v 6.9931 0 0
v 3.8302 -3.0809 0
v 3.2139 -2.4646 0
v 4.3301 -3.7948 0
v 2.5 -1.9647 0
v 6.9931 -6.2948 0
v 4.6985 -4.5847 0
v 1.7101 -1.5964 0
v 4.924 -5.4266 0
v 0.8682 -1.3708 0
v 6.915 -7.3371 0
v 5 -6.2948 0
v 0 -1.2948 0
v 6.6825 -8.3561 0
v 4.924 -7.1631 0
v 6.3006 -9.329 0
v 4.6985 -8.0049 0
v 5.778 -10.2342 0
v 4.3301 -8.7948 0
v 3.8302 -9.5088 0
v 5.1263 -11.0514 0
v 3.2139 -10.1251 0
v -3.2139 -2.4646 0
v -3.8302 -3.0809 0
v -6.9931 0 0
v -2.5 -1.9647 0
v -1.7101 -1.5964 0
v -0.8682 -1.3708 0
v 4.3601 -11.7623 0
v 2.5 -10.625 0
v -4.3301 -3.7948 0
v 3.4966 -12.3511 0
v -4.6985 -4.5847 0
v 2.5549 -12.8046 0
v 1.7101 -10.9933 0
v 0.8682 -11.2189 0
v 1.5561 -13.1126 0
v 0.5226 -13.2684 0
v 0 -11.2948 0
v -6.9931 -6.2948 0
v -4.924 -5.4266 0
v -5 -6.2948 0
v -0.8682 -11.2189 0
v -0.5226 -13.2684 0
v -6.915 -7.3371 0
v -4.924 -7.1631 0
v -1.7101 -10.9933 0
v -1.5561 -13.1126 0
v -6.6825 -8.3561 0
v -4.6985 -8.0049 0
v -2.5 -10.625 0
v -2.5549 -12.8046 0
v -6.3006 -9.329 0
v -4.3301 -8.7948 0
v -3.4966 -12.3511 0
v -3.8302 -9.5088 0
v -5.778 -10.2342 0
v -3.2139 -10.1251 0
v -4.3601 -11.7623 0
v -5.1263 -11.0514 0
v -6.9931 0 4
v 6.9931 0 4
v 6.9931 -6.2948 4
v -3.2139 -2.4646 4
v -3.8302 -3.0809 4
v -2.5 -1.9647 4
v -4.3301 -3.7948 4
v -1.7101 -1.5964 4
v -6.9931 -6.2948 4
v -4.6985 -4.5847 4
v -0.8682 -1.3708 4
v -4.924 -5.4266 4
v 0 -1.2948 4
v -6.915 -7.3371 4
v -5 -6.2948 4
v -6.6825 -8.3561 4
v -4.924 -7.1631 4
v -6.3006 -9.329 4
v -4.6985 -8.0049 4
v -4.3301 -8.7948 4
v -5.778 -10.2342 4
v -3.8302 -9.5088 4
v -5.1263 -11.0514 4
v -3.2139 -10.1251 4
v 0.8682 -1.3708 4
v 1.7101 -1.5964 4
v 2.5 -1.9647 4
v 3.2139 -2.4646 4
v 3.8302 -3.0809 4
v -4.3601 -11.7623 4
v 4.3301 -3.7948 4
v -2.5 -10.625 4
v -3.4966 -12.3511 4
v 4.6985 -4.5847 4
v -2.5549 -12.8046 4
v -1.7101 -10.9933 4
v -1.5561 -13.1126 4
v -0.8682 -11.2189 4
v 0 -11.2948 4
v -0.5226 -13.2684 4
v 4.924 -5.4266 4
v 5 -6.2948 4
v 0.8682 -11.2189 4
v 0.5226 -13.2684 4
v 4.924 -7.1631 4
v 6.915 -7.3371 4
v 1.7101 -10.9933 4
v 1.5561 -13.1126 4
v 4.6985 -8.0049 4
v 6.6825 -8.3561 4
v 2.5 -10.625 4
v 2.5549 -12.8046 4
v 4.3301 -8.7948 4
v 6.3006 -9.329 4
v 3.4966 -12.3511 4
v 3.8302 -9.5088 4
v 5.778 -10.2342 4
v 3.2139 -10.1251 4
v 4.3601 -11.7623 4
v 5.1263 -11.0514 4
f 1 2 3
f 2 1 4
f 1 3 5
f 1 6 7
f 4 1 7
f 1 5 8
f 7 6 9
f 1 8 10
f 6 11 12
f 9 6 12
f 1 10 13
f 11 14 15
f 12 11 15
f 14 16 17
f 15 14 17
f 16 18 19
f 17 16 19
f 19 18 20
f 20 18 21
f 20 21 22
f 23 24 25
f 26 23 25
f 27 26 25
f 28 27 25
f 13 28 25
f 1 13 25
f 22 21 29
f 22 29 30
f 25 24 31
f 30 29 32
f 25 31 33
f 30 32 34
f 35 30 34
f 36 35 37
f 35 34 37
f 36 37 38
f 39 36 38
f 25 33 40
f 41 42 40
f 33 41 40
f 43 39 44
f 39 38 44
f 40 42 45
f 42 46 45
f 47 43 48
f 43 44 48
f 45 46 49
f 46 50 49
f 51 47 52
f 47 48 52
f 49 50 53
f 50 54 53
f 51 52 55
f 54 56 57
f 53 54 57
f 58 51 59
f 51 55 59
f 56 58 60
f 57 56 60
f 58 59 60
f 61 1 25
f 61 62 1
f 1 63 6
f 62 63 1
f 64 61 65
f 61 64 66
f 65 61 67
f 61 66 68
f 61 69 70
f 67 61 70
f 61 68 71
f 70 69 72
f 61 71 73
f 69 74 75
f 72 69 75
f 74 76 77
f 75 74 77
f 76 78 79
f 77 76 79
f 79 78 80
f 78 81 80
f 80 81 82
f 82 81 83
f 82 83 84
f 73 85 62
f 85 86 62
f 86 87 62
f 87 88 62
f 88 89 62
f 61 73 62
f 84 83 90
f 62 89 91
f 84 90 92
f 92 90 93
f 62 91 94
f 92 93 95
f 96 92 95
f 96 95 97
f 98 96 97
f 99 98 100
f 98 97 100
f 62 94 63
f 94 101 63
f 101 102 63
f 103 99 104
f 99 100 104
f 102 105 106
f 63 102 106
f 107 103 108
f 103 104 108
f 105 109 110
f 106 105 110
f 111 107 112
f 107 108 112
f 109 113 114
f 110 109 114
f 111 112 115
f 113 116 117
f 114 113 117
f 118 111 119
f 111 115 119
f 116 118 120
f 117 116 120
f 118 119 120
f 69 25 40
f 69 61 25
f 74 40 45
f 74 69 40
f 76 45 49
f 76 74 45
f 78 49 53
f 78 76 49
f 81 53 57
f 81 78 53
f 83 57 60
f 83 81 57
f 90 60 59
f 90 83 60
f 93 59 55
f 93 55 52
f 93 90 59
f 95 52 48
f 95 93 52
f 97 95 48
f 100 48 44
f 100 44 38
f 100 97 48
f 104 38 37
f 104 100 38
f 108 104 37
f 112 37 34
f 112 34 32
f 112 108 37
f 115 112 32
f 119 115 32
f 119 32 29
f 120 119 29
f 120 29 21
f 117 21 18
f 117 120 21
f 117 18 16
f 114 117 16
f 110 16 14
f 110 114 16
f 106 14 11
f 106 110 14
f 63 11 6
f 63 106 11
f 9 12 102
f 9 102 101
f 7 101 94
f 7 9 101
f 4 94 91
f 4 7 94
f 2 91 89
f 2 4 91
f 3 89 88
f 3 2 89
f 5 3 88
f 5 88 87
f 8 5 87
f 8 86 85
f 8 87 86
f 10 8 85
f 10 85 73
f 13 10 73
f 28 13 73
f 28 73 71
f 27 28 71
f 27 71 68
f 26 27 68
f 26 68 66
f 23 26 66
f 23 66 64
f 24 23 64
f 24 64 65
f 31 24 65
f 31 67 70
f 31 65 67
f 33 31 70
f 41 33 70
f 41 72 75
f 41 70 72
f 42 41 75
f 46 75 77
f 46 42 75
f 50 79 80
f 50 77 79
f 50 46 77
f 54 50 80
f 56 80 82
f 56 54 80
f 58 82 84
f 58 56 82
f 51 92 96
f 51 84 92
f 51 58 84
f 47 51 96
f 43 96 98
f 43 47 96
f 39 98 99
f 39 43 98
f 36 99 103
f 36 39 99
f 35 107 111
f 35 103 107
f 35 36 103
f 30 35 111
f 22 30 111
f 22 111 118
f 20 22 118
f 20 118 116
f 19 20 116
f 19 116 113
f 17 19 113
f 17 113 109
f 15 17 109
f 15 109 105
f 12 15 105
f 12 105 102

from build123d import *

# Parameters (mm, degrees)
CUT_EXTRUDE1_DEPTH      = 16.539441625
CUT_EXTRUDE1_DEPTH_BACK = 16.539441625
SKETCH2_R               = 5


with BuildPart() as part:
    # Sketch1 → Loft1 section 0
    with BuildSketch(Plane.XY):
        with BuildLine():
            Line((6.993136448, 0), (-6.993136448, 0))
            Line((-6.993136448, 0), (-6.993136448, -6.29483871))
            ThreePointArc((-6.993136448, -6.29483871), (0, -13.287975158), (6.993136448, -6.29483871))
            Line((6.993136448, -6.29483871), (6.993136448, 0))
        make_face()
    # Sketch3 → Loft1 section 1
    with BuildSketch(Plane(origin=(0, 0, 4), x_dir=(-1, 0, 0), z_dir=(0, 0, -1))):
        with BuildLine():
            Line((6.993136448, 0), (-6.993136448, 0))
            Line((-6.993136448, 0), (-6.993136448, -6.29483871))
            ThreePointArc((-6.993136448, -6.29483871), (0, -13.287975158), (6.993136448, -6.29483871))
            Line((6.993136448, -6.29483871), (6.993136448, 0))
        make_face()
    loft()

    # Sketch2 → Cut-Extrude1 (cut, two sides: drawn at the far end of the back side and taken through both)
    with BuildSketch(Plane.XY.offset(-CUT_EXTRUDE1_DEPTH_BACK)):
        with Locations((0, -6.29483871)):
            Circle(SKETCH2_R)
    extrude(amount=CUT_EXTRUDE1_DEPTH + CUT_EXTRUDE1_DEPTH_BACK, mode=Mode.SUBTRACT)


solid = part.part
